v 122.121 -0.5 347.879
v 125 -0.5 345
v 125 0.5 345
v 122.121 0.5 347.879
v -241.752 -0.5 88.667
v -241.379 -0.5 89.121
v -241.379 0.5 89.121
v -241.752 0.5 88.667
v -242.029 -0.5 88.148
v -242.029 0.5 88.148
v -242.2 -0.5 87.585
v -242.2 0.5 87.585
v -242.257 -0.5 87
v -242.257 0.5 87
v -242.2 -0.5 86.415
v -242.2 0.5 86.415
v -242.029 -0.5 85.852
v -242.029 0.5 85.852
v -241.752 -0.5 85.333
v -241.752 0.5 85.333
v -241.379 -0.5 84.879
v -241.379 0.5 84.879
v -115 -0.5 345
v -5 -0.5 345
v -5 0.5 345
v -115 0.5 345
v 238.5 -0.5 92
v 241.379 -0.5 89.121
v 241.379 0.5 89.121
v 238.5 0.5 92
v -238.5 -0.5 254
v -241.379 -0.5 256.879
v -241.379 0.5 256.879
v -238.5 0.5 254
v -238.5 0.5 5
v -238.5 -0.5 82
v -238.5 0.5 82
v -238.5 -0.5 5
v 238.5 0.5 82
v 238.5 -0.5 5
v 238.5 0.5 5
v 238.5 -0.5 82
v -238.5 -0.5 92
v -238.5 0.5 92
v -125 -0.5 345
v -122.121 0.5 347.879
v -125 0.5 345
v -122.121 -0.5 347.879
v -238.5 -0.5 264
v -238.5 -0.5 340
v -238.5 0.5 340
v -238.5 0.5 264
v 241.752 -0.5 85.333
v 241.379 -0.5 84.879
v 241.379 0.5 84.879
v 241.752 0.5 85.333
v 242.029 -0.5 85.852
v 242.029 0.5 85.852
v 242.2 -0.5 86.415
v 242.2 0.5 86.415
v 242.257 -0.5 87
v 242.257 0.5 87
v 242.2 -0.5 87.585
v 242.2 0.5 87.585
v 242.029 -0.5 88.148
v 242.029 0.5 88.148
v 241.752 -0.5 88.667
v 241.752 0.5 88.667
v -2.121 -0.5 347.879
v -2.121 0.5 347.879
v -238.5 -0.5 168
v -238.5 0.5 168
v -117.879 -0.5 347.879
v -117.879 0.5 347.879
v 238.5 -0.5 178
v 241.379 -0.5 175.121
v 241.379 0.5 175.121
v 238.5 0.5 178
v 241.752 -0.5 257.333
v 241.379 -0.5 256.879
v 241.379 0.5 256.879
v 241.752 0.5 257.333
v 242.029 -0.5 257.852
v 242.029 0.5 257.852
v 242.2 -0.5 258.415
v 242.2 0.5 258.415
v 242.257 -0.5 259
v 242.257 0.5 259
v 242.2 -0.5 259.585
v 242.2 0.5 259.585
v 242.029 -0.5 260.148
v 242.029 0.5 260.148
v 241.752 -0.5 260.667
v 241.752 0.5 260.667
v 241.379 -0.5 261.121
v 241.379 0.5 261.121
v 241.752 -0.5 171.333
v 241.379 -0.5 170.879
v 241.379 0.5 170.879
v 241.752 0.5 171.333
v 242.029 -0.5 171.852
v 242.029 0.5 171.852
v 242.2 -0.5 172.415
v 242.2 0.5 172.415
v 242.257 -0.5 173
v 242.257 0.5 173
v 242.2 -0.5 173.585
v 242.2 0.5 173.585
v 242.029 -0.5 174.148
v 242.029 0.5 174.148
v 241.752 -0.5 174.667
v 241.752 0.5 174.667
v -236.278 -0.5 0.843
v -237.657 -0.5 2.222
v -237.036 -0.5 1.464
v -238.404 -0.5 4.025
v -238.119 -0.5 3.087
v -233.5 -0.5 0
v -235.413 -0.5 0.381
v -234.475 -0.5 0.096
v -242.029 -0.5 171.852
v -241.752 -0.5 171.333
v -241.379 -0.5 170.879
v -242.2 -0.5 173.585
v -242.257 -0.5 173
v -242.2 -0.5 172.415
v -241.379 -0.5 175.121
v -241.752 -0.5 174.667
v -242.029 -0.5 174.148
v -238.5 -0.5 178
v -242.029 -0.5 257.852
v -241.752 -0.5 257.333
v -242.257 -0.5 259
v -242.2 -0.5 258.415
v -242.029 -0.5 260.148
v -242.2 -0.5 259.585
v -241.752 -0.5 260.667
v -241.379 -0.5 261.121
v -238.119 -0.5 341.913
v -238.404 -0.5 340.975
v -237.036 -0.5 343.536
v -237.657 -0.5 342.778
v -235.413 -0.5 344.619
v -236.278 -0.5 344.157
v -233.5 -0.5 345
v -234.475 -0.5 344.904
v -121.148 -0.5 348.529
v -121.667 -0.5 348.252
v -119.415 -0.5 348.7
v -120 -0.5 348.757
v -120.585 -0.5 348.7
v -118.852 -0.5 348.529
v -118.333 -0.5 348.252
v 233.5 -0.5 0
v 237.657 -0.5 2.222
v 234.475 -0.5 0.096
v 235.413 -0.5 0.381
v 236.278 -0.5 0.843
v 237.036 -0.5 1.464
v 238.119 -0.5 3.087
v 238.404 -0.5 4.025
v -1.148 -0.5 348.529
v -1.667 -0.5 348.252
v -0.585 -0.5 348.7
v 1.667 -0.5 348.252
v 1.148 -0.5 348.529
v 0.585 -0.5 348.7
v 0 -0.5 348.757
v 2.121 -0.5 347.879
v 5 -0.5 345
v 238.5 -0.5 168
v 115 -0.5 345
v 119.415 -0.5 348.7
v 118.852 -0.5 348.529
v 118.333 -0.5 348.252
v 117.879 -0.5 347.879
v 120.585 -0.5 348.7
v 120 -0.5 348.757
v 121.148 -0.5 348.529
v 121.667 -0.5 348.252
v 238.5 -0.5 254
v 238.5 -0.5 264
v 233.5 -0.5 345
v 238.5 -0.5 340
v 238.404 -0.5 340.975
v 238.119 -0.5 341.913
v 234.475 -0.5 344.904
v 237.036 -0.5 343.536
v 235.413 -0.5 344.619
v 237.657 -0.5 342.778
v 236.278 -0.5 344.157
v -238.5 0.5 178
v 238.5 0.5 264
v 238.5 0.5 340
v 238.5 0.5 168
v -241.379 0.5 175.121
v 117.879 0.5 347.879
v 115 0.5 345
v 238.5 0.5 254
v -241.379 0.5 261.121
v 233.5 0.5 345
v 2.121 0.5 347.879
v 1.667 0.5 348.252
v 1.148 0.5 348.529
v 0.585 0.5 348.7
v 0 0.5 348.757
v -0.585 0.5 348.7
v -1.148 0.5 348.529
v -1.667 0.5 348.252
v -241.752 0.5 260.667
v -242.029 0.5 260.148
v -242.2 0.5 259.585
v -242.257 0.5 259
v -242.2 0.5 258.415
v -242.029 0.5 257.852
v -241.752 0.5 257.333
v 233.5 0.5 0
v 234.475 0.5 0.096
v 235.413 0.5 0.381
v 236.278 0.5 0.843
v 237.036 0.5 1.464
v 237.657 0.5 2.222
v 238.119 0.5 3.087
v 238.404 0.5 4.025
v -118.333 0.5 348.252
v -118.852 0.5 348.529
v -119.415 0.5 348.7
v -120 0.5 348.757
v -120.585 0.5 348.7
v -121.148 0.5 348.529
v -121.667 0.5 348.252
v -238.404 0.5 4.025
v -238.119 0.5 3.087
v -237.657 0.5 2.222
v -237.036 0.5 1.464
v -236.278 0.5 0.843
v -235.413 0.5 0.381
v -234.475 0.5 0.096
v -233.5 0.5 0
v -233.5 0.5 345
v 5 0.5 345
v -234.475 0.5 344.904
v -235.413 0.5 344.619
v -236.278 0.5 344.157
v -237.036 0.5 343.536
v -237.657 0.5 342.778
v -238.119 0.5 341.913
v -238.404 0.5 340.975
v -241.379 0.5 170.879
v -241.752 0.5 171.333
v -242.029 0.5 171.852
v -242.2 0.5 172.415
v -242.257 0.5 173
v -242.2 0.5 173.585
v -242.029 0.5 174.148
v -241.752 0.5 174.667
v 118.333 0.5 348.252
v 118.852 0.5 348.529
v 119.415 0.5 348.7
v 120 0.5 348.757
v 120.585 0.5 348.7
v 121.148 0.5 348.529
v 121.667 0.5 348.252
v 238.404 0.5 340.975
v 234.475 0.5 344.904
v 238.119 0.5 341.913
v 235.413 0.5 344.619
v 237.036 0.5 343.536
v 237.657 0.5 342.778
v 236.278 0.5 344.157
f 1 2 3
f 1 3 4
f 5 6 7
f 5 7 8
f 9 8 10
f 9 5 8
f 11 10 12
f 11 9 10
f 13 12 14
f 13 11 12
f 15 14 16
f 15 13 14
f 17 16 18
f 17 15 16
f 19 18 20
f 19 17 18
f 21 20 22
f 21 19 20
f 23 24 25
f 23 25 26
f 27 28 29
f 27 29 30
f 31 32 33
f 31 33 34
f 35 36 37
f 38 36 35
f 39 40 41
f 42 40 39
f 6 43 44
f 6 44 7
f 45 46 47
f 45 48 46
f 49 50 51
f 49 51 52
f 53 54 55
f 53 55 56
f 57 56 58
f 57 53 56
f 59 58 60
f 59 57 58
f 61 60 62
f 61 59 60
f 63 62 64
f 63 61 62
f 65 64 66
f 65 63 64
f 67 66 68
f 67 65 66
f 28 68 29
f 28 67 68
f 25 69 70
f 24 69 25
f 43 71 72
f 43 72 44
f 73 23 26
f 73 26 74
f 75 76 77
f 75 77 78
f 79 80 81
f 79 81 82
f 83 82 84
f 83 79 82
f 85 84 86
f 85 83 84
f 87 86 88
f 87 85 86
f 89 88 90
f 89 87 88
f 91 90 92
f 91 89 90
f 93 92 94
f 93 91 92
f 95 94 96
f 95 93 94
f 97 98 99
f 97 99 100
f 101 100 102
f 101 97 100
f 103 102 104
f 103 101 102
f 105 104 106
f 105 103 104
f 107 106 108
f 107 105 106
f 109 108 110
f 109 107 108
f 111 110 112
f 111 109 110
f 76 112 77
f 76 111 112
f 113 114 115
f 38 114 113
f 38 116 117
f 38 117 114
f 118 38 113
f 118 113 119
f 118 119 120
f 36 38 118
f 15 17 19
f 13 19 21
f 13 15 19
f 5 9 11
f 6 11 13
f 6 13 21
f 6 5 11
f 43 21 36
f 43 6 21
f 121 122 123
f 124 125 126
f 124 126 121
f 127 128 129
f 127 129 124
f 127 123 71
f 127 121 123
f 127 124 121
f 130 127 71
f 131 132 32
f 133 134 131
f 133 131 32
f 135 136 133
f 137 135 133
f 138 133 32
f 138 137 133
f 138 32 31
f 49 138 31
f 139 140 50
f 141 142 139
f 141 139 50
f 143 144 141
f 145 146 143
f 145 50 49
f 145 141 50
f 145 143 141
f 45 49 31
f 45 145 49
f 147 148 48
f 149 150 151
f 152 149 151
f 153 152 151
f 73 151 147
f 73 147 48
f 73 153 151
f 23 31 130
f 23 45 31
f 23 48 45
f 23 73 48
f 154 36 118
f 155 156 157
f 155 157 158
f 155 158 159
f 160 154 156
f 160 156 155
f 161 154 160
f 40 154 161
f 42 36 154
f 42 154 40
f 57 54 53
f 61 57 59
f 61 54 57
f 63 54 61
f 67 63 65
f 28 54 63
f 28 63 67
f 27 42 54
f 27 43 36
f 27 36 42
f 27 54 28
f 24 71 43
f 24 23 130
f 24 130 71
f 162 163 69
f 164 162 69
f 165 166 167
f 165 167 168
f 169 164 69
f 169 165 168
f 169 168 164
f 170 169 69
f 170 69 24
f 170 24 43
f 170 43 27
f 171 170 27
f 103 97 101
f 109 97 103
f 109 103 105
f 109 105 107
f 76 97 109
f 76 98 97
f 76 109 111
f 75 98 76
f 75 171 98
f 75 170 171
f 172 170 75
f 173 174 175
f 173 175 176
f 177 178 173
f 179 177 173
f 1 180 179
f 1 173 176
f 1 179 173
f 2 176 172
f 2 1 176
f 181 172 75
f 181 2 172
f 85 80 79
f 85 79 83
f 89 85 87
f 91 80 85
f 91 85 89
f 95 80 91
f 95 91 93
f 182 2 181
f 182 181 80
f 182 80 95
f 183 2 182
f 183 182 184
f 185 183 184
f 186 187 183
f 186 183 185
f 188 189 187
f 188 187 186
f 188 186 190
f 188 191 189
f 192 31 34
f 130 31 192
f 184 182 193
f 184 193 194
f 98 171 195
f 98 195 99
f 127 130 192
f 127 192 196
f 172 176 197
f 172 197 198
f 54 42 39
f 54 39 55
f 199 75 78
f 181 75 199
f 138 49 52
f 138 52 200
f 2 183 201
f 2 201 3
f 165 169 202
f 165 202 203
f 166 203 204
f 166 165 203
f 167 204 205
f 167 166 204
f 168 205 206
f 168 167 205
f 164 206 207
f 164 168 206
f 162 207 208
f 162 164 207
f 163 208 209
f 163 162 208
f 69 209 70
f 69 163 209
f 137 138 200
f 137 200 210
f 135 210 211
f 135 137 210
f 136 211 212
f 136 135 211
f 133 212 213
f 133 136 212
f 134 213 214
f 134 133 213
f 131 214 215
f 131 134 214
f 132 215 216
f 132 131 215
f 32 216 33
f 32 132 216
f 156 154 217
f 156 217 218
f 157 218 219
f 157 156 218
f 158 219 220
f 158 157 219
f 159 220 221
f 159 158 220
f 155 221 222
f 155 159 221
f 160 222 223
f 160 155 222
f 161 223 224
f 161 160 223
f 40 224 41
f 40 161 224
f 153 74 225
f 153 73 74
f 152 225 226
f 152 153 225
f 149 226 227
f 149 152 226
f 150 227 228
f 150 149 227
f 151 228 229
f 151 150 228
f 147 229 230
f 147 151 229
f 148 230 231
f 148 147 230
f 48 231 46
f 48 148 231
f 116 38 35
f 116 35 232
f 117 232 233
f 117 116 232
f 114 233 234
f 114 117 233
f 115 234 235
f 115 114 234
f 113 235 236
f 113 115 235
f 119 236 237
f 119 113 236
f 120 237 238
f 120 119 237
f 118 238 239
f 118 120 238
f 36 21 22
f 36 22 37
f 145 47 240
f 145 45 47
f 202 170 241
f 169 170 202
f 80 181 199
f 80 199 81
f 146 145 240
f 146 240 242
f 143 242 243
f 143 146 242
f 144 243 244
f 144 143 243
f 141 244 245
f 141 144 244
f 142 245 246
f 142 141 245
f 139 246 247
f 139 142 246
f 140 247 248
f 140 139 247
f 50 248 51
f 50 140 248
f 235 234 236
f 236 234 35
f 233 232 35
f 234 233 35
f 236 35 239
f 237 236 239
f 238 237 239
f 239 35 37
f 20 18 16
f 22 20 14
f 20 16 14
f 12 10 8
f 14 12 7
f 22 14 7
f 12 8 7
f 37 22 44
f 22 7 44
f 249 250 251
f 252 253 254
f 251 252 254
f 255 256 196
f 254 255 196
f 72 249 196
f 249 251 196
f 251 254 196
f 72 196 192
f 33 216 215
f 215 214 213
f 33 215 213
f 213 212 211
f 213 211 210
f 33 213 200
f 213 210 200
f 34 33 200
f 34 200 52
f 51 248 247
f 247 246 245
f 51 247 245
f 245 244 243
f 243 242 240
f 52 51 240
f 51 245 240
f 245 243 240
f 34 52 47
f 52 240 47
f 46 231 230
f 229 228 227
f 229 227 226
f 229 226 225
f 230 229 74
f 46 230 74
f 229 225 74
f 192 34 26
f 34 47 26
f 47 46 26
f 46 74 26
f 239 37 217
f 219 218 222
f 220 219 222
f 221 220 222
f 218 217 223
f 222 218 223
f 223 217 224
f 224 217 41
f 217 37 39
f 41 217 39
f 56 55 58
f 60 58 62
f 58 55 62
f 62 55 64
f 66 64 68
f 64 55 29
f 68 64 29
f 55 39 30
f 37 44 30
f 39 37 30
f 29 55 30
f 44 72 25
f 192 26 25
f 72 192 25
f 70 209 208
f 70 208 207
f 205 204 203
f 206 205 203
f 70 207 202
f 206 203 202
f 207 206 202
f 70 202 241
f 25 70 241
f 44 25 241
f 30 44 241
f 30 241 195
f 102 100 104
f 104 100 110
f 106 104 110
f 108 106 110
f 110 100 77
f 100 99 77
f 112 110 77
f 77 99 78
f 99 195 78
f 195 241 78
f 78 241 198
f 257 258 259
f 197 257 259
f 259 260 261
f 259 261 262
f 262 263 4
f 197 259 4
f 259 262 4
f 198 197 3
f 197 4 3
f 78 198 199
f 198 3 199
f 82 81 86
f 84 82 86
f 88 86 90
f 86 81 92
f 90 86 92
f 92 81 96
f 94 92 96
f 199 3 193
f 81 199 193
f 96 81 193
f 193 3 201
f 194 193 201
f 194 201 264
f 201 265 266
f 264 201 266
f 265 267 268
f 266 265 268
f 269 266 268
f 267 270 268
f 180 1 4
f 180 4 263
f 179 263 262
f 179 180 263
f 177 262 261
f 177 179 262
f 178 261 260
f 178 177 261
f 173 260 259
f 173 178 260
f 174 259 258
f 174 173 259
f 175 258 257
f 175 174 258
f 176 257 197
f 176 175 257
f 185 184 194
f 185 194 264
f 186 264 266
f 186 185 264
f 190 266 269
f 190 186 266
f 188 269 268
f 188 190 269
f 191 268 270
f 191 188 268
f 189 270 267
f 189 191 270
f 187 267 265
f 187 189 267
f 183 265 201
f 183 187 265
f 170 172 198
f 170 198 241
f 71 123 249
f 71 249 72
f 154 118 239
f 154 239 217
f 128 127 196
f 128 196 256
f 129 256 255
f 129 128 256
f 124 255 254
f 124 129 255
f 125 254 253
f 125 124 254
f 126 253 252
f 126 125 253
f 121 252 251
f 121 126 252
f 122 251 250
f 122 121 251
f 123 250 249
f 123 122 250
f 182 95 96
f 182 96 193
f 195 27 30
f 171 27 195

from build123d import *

# Parameters (mm, degrees)
F1_DEPTH = 0.5


with BuildPart() as f1:
    # F0 (on Front) → F1 (new body, symmetric)
    with BuildSketch(Plane.XZ):
        with BuildLine():
            Line((-125, 345), (-233.5, 345))
            ThreePointArc((-233.5, 345), (-237.035534, 343.535534), (-238.5, 340))
            Line((-238.5, 340), (-238.5, 264))
            Line((-238.5, 264), (-241.37868, 261.12132))
            ThreePointArc((-241.37868, 261.12132), (-242.257359, 259), (-241.37868, 256.87868))
            Line((-241.37868, 256.87868), (-238.5, 254))
            Line((-238.5, 254), (-238.5, 178))
            Line((-238.5, 178), (-241.37868, 175.12132))
            ThreePointArc((-241.37868, 175.12132), (-242.257359, 173), (-241.37868, 170.87868))
            Line((-241.37868, 170.87868), (-238.5, 168))
            Line((-238.5, 168), (-238.5, 92))
            Line((-238.5, 92), (-241.37868, 89.12132))
            ThreePointArc((-241.37868, 89.12132), (-242.257359, 87), (-241.37868, 84.87868))
            Line((-241.37868, 84.87868), (-238.5, 82))
            Line((-238.5, 82), (-238.5, 5))
            ThreePointArc((-238.5, 5), (-237.035534, 1.464466), (-233.5, 0))
            Line((-233.5, 0), (233.5, 0))
            ThreePointArc((233.5, 0), (237.035534, 1.464466), (238.5, 5))
            Line((238.5, 5), (238.5, 82))
            Line((238.5, 82), (241.37868, 84.87868))
            ThreePointArc((241.37868, 84.87868), (242.257359, 87), (241.37868, 89.12132))
            Line((241.37868, 89.12132), (238.5, 92))
            Line((238.5, 92), (238.5, 168))
            Line((238.5, 168), (241.37868, 170.87868))
            ThreePointArc((241.37868, 170.87868), (242.257359, 173), (241.37868, 175.12132))
            Line((241.37868, 175.12132), (238.5, 178))
            Line((238.5, 178), (238.5, 254))
            Line((238.5, 254), (241.37868, 256.87868))
            ThreePointArc((241.37868, 256.87868), (242.257359, 259), (241.37868, 261.12132))
            Line((241.37868, 261.12132), (238.5, 264))
            Line((238.5, 264), (238.5, 340))
            ThreePointArc((238.5, 340), (237.035534, 343.535534), (233.5, 345))
            Line((233.5, 345), (125, 345))
            Line((125, 345), (122.12132, 347.87868))
            ThreePointArc((122.12132, 347.87868), (120, 348.757359), (117.87868, 347.87868))
            Line((117.87868, 347.87868), (115, 345))
            Line((115, 345), (5, 345))
            Line((5, 345), (2.12132, 347.87868))
            ThreePointArc((2.12132, 347.87868), (0, 348.757359), (-2.12132, 347.87868))
            Line((-2.12132, 347.87868), (-5, 345))
            Line((-5, 345), (-115, 345))
            Line((-115, 345), (-117.87868, 347.87868))
            ThreePointArc((-117.87868, 347.87868), (-120, 348.757359), (-122.12132, 347.87868))
            Line((-122.12132, 347.87868), (-125, 345))
        make_face()
    extrude(amount=F1_DEPTH, both=True)


solid = f1.part
